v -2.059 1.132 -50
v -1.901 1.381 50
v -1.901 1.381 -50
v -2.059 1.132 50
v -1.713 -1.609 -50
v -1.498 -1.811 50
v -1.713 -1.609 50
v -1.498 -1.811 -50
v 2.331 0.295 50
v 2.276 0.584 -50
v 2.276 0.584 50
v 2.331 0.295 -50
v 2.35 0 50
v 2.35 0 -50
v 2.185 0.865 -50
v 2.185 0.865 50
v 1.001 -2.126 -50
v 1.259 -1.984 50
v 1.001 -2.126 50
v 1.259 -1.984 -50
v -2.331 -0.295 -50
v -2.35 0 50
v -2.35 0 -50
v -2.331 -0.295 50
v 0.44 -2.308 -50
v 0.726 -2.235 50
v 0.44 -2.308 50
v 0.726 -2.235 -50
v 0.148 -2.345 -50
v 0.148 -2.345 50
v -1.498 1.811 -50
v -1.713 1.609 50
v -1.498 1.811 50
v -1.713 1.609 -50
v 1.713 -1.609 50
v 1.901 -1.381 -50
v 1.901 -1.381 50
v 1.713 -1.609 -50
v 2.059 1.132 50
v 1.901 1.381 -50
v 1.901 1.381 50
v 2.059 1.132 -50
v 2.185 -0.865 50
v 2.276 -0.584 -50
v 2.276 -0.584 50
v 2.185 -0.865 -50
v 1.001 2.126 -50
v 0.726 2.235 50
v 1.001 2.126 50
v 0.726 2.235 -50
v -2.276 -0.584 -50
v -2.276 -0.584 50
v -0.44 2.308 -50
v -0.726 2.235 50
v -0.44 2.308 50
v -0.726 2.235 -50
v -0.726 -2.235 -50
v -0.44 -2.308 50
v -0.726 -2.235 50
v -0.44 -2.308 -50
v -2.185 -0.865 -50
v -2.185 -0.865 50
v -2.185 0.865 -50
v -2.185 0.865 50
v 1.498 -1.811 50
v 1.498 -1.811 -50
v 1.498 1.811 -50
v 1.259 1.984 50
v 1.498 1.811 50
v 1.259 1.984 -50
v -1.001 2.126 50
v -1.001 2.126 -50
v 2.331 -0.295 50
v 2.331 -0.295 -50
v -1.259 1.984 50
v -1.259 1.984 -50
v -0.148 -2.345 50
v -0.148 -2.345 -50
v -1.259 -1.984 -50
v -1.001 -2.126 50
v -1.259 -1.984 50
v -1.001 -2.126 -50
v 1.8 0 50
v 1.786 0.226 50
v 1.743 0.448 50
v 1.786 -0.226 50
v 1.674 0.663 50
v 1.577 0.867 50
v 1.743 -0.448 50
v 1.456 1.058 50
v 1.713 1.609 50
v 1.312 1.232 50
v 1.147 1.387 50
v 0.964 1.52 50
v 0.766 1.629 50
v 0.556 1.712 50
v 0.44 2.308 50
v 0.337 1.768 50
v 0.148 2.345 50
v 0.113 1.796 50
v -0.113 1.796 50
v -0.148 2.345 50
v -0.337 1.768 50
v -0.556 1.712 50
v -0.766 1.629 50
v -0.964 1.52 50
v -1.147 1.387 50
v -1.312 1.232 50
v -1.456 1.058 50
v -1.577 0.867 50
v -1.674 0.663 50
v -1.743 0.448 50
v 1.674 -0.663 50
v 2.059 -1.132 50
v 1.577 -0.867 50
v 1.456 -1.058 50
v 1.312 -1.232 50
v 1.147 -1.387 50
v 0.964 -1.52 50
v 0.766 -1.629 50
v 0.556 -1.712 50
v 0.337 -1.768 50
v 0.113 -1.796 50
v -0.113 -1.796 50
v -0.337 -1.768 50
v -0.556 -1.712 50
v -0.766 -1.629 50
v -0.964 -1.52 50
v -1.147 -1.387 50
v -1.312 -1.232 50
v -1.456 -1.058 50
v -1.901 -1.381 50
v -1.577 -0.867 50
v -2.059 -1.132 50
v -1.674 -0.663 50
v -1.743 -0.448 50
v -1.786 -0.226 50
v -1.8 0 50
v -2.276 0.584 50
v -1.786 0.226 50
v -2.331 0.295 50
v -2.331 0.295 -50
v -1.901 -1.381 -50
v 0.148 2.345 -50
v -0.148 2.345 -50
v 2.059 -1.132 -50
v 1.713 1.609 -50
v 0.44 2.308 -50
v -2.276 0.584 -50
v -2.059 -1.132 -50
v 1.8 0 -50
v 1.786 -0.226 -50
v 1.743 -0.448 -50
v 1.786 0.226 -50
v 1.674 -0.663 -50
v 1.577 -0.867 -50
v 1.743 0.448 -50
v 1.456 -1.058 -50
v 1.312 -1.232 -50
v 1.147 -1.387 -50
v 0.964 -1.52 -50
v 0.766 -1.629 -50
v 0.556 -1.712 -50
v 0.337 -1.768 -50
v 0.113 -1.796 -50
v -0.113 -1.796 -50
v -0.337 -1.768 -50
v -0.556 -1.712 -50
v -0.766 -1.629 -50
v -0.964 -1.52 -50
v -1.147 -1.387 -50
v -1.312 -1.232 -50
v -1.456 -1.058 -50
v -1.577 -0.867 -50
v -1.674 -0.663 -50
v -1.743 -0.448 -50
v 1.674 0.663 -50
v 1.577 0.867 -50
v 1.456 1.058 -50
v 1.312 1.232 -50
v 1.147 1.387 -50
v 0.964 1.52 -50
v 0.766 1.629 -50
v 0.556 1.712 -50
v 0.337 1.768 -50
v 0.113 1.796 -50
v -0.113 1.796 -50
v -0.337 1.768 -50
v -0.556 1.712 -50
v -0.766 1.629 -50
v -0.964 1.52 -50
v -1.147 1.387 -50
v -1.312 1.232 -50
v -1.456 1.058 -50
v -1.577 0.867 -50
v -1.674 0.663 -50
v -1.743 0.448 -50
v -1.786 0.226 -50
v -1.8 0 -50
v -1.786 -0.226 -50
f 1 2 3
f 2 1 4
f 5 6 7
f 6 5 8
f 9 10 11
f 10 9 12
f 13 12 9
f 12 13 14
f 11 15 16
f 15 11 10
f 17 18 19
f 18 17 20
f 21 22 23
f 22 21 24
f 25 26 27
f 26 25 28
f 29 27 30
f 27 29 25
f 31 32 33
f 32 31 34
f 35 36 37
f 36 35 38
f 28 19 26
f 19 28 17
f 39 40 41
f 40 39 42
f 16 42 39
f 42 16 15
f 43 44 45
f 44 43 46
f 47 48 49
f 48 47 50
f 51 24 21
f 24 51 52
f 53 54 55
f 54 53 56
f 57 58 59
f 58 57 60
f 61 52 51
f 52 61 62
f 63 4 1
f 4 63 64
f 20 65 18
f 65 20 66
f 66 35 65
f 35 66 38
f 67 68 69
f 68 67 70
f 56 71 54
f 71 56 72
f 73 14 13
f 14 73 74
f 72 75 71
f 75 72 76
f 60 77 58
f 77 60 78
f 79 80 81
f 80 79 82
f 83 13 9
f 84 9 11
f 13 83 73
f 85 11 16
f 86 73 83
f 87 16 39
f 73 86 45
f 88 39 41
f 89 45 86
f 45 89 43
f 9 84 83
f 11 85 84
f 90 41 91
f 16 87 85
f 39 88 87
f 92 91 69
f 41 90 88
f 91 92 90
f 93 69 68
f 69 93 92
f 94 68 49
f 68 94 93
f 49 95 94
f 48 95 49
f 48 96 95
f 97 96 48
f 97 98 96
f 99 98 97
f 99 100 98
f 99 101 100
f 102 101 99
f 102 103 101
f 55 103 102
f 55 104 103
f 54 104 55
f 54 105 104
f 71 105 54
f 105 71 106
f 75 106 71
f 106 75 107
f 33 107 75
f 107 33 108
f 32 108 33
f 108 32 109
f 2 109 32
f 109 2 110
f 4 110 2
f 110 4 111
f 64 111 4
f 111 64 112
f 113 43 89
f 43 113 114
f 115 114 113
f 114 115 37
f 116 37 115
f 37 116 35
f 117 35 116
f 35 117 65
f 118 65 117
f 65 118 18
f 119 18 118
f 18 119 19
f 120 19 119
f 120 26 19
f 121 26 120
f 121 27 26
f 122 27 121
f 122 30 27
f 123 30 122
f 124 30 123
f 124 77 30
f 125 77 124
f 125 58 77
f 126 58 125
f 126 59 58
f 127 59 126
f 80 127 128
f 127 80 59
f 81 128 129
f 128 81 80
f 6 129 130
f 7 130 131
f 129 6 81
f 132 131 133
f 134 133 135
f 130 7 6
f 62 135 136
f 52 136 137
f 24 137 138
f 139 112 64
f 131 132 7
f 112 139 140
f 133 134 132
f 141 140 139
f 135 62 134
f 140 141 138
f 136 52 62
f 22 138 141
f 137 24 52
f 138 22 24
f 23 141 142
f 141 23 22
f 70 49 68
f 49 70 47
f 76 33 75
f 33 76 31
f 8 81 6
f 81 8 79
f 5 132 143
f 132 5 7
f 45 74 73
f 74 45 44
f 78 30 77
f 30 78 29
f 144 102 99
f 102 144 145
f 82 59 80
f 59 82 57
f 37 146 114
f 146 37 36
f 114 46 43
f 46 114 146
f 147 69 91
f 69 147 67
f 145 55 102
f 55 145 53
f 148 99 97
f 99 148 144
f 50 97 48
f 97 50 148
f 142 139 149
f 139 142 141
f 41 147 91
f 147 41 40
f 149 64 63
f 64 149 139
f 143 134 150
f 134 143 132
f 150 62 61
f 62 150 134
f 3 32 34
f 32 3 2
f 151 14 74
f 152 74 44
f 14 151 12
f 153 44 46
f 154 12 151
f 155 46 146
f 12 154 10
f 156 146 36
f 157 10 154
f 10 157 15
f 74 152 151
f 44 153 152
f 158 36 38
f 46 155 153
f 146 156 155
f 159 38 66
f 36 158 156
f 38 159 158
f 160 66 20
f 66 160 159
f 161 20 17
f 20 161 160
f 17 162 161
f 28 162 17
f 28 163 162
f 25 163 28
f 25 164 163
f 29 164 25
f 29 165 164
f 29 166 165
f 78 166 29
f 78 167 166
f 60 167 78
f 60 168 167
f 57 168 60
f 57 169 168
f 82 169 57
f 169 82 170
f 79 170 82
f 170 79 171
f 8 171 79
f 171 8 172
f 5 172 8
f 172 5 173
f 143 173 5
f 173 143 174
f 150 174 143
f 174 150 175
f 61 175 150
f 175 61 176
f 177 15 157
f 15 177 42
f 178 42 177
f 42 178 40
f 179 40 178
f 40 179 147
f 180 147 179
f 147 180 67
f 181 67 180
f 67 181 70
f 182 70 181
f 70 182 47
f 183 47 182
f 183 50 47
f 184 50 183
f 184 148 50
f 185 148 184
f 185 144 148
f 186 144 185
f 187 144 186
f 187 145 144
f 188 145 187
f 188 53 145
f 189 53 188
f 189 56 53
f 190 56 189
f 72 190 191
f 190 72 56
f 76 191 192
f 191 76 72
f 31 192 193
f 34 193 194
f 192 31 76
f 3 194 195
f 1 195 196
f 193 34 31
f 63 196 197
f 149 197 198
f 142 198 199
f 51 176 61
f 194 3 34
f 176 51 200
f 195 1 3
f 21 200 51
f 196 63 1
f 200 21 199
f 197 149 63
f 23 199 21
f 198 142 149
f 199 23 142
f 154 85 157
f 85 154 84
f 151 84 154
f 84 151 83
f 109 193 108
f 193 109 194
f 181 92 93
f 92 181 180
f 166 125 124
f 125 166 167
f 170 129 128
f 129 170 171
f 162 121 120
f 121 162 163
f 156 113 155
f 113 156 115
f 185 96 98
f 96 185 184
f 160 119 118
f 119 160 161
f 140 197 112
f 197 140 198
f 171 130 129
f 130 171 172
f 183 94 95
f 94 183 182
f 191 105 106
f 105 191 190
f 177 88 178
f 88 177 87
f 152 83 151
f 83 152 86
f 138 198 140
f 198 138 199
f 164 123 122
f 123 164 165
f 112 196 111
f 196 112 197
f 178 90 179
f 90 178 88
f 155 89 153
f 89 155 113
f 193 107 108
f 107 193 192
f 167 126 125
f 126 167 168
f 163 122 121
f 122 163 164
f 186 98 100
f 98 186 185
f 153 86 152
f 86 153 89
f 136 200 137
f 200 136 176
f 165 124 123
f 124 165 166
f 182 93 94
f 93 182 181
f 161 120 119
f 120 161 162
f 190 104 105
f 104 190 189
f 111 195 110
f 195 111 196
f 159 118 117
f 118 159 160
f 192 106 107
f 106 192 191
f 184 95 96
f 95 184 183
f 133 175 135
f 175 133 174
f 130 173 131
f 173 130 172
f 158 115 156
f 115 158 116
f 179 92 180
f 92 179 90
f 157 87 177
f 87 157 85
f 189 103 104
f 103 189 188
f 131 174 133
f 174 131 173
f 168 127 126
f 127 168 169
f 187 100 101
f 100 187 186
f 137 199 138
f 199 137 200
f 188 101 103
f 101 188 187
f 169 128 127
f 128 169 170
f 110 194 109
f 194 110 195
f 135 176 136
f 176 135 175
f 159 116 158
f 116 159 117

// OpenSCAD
$fn = 50;


difference() {
	union() {
		translate(v = [0, 0, -50.0000000000]) {
			cylinder(h = 100, r = 2.3500000000);
		}
	}
	union() {
		#translate(v = [0, 0, -100.0000000000]) {
			cylinder(h = 200, r = 1.8000000000);
		}
	}
}
